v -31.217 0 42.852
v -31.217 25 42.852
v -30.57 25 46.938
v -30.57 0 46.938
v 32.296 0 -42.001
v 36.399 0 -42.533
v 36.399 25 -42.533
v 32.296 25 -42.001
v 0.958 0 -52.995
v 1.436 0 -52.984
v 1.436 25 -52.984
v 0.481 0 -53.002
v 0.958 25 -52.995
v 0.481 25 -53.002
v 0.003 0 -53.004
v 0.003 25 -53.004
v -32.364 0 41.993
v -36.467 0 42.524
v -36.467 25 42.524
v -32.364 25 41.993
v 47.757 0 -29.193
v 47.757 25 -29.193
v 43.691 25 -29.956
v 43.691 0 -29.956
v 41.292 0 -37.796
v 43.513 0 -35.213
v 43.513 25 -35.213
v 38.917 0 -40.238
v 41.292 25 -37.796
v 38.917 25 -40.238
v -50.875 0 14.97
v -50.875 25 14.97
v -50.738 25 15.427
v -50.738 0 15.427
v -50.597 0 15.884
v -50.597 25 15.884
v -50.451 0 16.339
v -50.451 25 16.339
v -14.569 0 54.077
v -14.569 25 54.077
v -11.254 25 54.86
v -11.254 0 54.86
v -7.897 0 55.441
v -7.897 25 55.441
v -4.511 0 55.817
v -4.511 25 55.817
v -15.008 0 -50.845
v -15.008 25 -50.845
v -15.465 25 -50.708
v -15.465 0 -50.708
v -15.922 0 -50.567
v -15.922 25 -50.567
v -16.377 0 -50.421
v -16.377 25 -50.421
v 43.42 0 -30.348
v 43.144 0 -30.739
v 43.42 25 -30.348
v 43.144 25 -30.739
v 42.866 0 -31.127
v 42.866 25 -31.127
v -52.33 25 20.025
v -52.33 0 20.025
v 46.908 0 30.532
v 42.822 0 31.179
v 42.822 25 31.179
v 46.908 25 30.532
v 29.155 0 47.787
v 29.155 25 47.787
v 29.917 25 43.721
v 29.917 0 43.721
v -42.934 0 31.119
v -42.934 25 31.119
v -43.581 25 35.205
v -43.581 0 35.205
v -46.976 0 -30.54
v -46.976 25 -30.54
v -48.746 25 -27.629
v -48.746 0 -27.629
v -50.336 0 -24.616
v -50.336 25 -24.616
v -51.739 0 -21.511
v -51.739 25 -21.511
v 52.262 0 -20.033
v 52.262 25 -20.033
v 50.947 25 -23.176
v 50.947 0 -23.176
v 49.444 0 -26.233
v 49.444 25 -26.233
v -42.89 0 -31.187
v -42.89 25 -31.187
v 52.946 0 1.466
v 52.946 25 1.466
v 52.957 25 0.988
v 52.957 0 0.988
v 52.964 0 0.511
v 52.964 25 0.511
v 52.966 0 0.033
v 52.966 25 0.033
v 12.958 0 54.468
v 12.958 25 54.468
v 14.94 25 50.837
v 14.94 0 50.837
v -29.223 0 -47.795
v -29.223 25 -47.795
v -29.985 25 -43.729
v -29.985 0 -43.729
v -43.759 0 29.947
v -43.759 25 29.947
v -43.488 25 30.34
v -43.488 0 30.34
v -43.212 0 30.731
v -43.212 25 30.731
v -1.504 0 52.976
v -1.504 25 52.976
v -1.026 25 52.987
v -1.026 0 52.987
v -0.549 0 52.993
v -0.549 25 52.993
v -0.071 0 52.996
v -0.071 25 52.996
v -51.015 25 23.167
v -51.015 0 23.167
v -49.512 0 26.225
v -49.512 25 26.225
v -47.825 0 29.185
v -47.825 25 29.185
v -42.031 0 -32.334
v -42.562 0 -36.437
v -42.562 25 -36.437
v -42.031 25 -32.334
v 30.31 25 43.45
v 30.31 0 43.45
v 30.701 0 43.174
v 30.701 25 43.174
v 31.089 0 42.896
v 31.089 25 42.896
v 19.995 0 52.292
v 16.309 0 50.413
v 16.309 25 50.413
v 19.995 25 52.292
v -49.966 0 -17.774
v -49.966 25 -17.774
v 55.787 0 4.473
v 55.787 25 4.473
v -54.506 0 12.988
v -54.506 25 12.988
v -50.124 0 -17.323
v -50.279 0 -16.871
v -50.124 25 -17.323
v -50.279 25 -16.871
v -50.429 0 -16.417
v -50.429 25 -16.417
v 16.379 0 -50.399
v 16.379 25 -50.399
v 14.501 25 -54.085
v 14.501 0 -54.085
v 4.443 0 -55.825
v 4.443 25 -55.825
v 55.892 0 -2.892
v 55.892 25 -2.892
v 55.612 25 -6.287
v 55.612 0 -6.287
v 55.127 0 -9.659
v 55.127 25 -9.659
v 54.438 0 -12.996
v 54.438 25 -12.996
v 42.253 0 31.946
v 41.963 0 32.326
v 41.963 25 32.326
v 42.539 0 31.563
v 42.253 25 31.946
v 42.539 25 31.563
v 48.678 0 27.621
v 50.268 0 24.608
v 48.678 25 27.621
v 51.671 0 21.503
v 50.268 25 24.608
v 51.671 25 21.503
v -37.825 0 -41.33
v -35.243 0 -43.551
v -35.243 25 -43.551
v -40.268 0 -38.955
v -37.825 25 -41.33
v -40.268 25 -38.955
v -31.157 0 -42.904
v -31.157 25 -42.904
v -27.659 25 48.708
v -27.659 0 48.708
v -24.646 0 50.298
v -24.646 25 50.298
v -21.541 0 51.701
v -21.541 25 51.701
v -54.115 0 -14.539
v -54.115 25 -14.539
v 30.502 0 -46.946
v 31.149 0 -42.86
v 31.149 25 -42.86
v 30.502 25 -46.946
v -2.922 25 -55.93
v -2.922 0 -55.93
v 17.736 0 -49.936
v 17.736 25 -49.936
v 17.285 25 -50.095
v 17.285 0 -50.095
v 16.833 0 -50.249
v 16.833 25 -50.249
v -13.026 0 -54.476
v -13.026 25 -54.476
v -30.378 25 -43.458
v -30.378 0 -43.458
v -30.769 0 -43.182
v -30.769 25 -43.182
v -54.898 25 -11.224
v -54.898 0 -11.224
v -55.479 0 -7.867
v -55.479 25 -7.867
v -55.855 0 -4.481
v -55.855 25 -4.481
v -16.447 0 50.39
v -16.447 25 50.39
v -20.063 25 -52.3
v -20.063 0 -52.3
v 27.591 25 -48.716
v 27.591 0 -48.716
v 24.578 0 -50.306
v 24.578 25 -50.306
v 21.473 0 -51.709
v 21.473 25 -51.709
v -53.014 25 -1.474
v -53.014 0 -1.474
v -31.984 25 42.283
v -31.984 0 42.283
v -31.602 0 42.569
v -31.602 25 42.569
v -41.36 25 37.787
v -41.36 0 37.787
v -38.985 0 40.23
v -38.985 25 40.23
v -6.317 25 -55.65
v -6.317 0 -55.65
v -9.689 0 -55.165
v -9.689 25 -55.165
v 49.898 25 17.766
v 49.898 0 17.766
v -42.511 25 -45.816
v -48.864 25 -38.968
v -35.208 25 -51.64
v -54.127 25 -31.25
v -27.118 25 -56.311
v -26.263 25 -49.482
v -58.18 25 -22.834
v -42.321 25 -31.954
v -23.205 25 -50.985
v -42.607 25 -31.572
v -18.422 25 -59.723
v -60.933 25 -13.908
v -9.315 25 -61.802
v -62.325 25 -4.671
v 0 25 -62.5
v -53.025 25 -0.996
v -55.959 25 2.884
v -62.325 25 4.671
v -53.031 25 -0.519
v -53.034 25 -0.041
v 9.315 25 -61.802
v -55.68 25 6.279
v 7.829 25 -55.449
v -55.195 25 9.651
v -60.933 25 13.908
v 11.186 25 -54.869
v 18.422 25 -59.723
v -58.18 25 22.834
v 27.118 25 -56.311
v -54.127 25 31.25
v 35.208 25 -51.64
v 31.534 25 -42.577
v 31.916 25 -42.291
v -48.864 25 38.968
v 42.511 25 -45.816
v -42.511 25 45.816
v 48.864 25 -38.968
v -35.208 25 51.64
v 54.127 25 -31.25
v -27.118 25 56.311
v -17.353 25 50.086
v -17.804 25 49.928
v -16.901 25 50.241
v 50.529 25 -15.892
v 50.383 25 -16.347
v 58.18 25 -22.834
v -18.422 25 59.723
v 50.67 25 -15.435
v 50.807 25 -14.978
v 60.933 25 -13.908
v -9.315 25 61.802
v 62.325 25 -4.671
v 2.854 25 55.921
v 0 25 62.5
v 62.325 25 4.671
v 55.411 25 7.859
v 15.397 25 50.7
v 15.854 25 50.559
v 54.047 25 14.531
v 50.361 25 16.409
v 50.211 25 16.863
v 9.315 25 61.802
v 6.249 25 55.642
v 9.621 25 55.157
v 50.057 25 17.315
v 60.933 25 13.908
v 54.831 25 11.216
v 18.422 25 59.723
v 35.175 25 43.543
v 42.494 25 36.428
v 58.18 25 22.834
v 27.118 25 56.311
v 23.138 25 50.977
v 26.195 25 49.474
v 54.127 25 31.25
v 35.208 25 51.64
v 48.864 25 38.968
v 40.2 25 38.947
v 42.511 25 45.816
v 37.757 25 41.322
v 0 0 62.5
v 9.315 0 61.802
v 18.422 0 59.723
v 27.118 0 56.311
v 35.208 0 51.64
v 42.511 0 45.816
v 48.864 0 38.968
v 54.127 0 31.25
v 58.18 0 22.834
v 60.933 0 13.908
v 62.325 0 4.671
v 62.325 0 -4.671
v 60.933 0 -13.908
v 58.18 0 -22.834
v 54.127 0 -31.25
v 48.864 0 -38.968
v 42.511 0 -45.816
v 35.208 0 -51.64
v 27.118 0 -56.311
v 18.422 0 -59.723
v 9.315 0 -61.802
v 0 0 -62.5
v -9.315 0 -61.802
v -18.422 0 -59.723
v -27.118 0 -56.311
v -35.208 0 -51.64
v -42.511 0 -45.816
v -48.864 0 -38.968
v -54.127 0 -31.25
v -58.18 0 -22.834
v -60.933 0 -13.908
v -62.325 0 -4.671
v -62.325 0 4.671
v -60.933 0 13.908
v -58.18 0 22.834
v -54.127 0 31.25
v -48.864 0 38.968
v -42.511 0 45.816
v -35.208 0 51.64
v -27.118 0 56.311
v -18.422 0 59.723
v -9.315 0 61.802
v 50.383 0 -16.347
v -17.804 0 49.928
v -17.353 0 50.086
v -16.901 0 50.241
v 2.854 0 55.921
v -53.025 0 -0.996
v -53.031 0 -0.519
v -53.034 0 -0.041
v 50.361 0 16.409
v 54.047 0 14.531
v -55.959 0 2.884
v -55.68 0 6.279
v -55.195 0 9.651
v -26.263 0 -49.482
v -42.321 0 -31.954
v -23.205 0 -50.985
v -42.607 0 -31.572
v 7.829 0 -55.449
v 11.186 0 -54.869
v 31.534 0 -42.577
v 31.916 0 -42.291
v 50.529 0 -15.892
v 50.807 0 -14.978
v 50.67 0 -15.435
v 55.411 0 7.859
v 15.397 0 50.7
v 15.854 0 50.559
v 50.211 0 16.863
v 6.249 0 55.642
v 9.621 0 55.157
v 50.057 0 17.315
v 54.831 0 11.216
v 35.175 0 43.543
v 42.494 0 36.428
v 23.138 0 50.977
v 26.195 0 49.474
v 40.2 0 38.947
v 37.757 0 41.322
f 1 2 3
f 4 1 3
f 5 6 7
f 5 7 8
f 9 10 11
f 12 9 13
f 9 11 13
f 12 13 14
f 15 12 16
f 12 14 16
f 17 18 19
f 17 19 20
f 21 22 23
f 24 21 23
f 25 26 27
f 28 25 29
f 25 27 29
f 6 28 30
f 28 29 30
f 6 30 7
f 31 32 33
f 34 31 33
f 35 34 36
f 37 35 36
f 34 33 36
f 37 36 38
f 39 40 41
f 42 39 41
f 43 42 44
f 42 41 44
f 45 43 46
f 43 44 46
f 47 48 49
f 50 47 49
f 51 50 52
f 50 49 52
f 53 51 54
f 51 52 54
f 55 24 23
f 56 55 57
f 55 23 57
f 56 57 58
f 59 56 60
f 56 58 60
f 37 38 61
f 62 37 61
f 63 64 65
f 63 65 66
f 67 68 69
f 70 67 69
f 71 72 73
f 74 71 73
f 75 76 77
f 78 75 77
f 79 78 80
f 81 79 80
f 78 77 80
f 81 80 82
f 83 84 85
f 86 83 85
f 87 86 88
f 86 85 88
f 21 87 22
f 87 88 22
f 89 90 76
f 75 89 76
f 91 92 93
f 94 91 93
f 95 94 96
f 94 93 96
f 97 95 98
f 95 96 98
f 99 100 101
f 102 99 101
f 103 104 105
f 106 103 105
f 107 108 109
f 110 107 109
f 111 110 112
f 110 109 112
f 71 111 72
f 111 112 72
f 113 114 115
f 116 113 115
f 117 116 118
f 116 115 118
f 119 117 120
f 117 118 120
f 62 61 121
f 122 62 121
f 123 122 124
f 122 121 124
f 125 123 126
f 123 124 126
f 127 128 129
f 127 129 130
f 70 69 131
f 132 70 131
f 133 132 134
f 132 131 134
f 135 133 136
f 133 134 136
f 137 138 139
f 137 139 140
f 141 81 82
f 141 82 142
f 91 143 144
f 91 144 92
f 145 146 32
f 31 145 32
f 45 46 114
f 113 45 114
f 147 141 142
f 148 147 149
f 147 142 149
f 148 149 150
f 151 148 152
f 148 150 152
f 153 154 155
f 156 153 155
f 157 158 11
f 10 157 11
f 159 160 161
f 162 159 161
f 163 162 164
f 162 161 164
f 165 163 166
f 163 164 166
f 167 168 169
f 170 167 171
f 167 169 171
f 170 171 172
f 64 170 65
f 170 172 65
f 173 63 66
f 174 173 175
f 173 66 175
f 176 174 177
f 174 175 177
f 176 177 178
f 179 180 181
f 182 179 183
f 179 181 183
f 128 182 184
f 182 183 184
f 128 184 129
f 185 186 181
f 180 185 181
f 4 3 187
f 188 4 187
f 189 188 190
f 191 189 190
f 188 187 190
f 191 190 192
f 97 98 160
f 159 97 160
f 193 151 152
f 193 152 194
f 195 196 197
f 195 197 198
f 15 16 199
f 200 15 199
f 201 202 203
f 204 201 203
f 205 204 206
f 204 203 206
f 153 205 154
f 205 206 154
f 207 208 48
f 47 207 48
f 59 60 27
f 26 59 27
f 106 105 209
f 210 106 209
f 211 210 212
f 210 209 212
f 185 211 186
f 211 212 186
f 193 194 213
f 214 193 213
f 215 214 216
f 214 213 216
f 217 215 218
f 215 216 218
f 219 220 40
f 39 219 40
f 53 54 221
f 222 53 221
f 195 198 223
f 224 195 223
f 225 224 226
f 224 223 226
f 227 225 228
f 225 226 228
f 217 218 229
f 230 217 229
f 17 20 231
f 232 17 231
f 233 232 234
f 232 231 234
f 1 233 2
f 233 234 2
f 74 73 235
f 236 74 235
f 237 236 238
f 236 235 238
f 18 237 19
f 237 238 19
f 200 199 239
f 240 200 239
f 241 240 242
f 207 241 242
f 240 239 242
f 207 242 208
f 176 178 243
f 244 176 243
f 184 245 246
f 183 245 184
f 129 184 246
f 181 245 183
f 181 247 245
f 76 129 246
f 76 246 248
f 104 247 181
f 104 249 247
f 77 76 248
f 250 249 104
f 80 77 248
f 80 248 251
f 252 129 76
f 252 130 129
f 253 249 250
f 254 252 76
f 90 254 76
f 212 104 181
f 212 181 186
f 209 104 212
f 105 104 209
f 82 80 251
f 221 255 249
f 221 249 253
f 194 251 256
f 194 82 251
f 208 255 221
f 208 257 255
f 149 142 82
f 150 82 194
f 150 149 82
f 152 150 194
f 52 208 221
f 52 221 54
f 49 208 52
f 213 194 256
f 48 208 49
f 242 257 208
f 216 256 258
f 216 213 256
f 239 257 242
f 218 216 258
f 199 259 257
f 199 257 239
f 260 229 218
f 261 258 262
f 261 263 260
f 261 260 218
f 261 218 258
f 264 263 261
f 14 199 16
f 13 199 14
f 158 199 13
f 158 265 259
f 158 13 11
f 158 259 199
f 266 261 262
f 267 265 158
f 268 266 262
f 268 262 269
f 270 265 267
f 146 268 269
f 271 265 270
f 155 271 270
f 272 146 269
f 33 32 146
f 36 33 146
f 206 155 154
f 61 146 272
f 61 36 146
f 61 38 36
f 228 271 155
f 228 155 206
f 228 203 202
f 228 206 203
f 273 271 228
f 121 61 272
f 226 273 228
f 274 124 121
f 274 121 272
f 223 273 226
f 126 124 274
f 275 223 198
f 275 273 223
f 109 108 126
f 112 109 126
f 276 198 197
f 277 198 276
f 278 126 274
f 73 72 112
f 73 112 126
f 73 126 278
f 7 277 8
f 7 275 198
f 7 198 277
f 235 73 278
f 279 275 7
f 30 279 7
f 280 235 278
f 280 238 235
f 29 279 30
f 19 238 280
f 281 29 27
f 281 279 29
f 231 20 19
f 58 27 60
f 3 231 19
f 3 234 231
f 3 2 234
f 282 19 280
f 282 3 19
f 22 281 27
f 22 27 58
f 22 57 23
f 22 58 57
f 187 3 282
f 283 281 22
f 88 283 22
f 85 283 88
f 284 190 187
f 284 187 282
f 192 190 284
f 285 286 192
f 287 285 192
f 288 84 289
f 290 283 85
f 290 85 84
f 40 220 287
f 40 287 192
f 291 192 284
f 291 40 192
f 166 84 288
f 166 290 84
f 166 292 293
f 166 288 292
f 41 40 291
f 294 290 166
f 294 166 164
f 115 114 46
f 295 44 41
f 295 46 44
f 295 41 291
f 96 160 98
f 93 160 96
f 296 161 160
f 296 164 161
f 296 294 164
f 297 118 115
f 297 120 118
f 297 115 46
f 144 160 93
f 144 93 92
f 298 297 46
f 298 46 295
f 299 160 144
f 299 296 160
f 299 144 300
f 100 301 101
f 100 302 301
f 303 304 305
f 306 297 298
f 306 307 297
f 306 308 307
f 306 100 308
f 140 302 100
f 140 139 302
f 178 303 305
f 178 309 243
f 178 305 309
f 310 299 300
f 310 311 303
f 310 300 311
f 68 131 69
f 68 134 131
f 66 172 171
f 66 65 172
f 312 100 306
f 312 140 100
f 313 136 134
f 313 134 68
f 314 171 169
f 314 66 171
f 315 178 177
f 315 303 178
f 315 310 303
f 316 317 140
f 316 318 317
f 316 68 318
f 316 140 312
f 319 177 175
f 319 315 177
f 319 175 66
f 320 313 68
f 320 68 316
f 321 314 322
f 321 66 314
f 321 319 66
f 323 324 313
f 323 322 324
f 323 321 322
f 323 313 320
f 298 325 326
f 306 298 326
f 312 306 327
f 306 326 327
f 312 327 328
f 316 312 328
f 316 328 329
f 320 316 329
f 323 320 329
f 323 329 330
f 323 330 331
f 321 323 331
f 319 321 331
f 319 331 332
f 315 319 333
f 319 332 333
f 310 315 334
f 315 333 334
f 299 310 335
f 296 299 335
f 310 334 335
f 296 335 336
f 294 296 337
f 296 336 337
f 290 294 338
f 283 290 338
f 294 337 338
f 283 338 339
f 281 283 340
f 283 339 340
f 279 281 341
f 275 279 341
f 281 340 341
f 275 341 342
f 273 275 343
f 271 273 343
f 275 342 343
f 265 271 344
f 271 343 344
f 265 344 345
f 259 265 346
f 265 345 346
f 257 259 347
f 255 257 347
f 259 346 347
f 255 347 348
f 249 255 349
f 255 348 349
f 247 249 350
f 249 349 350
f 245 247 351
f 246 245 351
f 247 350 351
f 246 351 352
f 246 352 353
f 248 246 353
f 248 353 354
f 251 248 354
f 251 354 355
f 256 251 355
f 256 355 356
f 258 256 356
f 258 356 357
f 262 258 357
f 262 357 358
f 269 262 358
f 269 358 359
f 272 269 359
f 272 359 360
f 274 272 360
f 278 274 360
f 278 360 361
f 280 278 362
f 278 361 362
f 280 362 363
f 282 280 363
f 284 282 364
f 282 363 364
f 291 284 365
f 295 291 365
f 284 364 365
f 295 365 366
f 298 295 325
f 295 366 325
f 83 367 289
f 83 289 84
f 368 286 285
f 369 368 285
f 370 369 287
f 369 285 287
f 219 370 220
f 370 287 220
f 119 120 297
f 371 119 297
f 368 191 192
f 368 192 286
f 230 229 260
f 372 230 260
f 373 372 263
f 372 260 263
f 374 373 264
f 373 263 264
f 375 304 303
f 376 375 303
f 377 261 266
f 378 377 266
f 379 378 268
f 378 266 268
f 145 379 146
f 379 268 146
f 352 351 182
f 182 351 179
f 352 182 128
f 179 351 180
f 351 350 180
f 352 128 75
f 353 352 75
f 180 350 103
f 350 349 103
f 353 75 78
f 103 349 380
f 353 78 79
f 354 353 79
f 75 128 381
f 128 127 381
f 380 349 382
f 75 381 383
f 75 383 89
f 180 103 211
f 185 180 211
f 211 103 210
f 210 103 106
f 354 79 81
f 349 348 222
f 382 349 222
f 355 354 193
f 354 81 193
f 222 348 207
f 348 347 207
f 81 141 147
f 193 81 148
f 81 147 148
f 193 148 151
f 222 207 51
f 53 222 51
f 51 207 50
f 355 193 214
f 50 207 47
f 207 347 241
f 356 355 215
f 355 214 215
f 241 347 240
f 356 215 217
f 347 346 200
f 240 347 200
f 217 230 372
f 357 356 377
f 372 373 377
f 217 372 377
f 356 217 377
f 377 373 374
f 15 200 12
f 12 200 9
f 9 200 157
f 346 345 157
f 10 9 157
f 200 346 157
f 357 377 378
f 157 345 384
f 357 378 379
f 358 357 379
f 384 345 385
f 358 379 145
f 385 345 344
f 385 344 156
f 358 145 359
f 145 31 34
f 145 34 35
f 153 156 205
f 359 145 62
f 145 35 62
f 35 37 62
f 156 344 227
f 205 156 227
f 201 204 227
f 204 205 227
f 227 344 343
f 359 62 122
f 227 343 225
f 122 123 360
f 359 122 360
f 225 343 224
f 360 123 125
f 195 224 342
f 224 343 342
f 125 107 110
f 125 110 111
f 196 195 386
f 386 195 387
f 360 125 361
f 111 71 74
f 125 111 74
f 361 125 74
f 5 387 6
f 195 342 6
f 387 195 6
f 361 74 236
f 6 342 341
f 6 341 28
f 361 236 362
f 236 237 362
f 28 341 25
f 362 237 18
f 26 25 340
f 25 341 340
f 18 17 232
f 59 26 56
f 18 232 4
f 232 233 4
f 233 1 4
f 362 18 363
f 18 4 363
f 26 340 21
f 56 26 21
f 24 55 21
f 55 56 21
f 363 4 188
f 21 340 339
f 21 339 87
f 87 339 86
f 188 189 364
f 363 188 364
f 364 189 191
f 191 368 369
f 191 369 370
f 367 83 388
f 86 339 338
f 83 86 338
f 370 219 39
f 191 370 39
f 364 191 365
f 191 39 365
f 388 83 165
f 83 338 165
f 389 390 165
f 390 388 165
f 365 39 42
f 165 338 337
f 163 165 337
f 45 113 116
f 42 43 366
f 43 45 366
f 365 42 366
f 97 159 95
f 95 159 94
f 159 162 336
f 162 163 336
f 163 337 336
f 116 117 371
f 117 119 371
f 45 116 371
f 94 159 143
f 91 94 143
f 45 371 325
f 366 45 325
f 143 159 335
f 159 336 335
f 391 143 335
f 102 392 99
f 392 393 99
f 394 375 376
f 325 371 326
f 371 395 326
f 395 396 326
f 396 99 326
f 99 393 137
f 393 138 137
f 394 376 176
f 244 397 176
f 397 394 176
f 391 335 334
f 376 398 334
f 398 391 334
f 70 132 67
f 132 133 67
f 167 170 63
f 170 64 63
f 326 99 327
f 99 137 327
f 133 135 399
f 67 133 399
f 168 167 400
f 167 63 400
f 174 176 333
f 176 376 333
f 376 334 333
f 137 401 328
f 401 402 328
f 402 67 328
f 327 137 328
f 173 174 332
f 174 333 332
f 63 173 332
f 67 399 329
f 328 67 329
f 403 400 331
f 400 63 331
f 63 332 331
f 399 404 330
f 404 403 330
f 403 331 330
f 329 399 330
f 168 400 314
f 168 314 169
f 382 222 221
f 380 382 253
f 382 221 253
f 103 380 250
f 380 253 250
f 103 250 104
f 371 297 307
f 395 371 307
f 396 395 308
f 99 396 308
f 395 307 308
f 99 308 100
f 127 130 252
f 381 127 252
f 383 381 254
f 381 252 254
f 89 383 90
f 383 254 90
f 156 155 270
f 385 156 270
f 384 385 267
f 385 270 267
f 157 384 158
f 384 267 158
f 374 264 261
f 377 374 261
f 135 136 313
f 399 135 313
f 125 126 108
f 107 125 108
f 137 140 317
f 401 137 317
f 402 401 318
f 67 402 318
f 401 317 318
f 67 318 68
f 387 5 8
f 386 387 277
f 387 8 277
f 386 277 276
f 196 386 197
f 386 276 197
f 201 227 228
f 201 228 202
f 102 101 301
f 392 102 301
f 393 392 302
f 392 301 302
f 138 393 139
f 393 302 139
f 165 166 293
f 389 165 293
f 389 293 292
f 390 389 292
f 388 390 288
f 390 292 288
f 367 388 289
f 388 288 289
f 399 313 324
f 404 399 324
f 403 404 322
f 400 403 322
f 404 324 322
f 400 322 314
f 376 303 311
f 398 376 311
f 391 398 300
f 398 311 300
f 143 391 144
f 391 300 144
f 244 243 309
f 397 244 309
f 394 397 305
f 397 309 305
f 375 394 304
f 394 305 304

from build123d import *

# Parameters (mm, degrees)
SKETCH1_R           = 62.5
BOSS_EXTRUDE1_DEPTH = 25
CAVITY1_DEPTH       = 25
CUT_EXTRUDE1_DEPTH  = 25


# Read off the part's stored shape, not the designer's step: Cavity1
with BuildPart() as part:
    # Sketch1 → Boss-Extrude1 (new body)
    with BuildSketch(Plane(origin=(0, 0, 0), x_dir=(1, 0, 0), z_dir=(0, 1, 0))):
        with Locations(Location((0, 0, 0), (0, 0, 270))):
            Circle(SKETCH1_R)
    extrude(amount=BOSS_EXTRUDE1_DEPTH)

    # Cavity1 outline → Cavity1 (cut)
    with BuildSketch(Plane(origin=(0, 0, 0), x_dir=(1, 0, 0), z_dir=(0, 1, 0))):
        with BuildLine():
            Line((16.350867892, -49.873660473), (20.022970331, -51.745036944))
            ThreePointArc((20.022970331, -51.745036944), (24.456878574, -49.800038203), (28.704396647, -47.476000203))
            Line((28.704396647, -47.476000203), (29.464309883, -43.425207924))
            ThreePointArc((29.464309883, -43.425207924), (30.217762384, -42.903777412), (30.961999914, -42.369276757))
            Line((30.961999914, -42.369276757), (35.032663999, -43.014319485))
            ThreePointArc((35.032663999, -43.014319485), (38.648523661, -39.79436276), (41.969986165, -36.271516008))
            Line((41.969986165, -36.271516008), (41.440942946, -32.18415751))
            ThreePointArc((41.440942946, -32.18415751), (41.996387967, -31.455417996), (42.539030133, -30.717095621))
            Line((42.539030133, -30.717095621), (46.609790903, -30.07266333))
            ThreePointArc((46.609790903, -30.07266333), (49.053656447, -25.89294042), (51.12393549, -21.5161257))
            Line((51.12393549, -21.5161257), (49.357722251, -17.792300112))
            ThreePointArc((49.357722251, -17.792300112), (49.660788964, -16.927585698), (49.94871817, -16.05771374))
            Line((49.94871817, -16.05771374), (53.621101197, -14.186887953))
            ThreePointArc((53.621101197, -14.186887953), (54.653750036, -9.456539258), (55.270192281, -4.654189691))
            Line((55.270192281, -4.654189691), (52.43969828, -1.658411006))
            ThreePointArc((52.43969828, -1.658411006), (52.460720403, -0.742365963), (52.465752134, 0.173906448))
            Line((52.465752134, 0.173906448), (55.380278979, 3.087996269))
            ThreePointArc((55.380278979, 3.087996269), (54.900628251, 7.905931261), (54.002892036, 12.66372824))
            Line((54.002892036, 12.66372824), (50.385185747, 14.63821233))
            ThreePointArc((50.385185747, 14.63821233), (50.122105488, 15.515919131), (49.843747202, 16.388900869))
            Line((49.843747202, 16.388900869), (51.715123672, 20.061003308))
            ThreePointArc((51.715123672, 20.061003308), (49.770124931, 24.49491155), (47.446086932, 28.742429624))
            Line((47.446086932, 28.742429624), (43.395294653, 29.50234286))
            ThreePointArc((43.395294653, 29.50234286), (42.87386414, 30.255795361), (42.339363485, 31.000032891))
            Line((42.339363485, 31.000032891), (42.984406214, 35.070696976))
            ThreePointArc((42.984406214, 35.070696976), (39.764449489, 38.686556638), (36.241602736, 42.008019142))
            Line((36.241602736, 42.008019142), (32.154244239, 41.478975923))
            ThreePointArc((32.154244239, 41.478975923), (31.425504725, 42.034420944), (30.68718235, 42.57706311))
            Line((30.68718235, 42.57706311), (30.042750059, 46.64782388))
            ThreePointArc((30.042750059, 46.64782388), (25.863027148, 49.091689424), (21.486212429, 51.161968467))
            Line((21.486212429, 51.161968467), (17.762386841, 49.395755228))
            ThreePointArc((17.762386841, 49.395755228), (16.897672427, 49.698821941), (16.027800469, 49.986751147))
            Line((16.027800469, 49.986751147), (14.156974682, 53.659134174))
            ThreePointArc((14.156974682, 53.659134174), (9.426625987, 54.691783013), (4.62427642, 55.308225258))
            Line((4.62427642, 55.308225258), (1.628497735, 52.477731257))
            ThreePointArc((1.628497735, 52.477731257), (0.712452692, 52.49875338), (-0.20381972, 52.503785111))
            Line((-0.20381972, 52.503785111), (-3.11790954, 55.418311956))
            ThreePointArc((-3.11790954, 55.418311956), (-7.935844532, 54.938661228), (-12.693641511, 54.040925013))
            Line((-12.693641511, 54.040925013), (-14.668125602, 50.423218724))
            ThreePointArc((-14.668125602, 50.423218724), (-15.545832402, 50.160138465), (-16.41881414, 49.881780179))
            Line((-16.41881414, 49.881780179), (-20.090916579, 51.753156649))
            ThreePointArc((-20.090916579, 51.753156649), (-24.524824822, 49.808157908), (-28.772342895, 47.484119909))
            Line((-28.772342895, 47.484119909), (-29.532256132, 43.43332763))
            ThreePointArc((-29.532256132, 43.43332763), (-30.285708633, 42.911897117), (-31.029946162, 42.377396462))
            Line((-31.029946162, 42.377396462), (-35.100610248, 43.022439191))
            ThreePointArc((-35.100610248, 43.022439191), (-38.71646991, 39.802482465), (-42.037932414, 36.279635713))
            Line((-42.037932414, 36.279635713), (-41.508889194, 32.192277216))
            ThreePointArc((-41.508889194, 32.192277216), (-42.064334215, 31.463537702), (-42.606976382, 30.725215327))
            Line((-42.606976382, 30.725215327), (-46.677737151, 30.080783036))
            ThreePointArc((-46.677737151, 30.080783036), (-49.121602695, 25.901060125), (-51.191881738, 21.524245406))
            Line((-51.191881738, 21.524245406), (-49.425668499, 17.800419818))
            ThreePointArc((-49.425668499, 17.800419818), (-49.728735212, 16.935705404), (-50.016664419, 16.065833446))
            Line((-50.016664419, 16.065833446), (-53.689047445, 14.195007659))
            ThreePointArc((-53.689047445, 14.195007659), (-54.721696284, 9.464658964), (-55.33813853, 4.662309397))
            Line((-55.33813853, 4.662309397), (-52.507644528, 1.666530712))
            ThreePointArc((-52.507644528, 1.666530712), (-52.528666651, 0.750485669), (-52.533698382, -0.165786743))
            Line((-52.533698382, -0.165786743), (-55.448225228, -3.079876563))
            ThreePointArc((-55.448225228, -3.079876563), (-54.968574499, -7.897811555), (-54.070838284, -12.655608534))
            Line((-54.070838284, -12.655608534), (-50.453131995, -14.630092625))
            ThreePointArc((-50.453131995, -14.630092625), (-50.190051736, -15.507799425), (-49.91169345, -16.380781163))
            Line((-49.91169345, -16.380781163), (-51.783069921, -20.052883602))
            ThreePointArc((-51.783069921, -20.052883602), (-49.83807118, -24.486791845), (-47.51403318, -28.734309918))
            Line((-47.51403318, -28.734309918), (-43.463240901, -29.494223155))
            ThreePointArc((-43.463240901, -29.494223155), (-42.941810389, -30.247675656), (-42.407309734, -30.991913185))
            Line((-42.407309734, -30.991913185), (-43.052352462, -35.062577271))
            ThreePointArc((-43.052352462, -35.062577271), (-39.832395737, -38.678436932), (-36.309548985, -41.999899437))
            Line((-36.309548985, -41.999899437), (-32.222190487, -41.470856217))
            ThreePointArc((-32.222190487, -41.470856217), (-31.493450973, -42.026301238), (-30.755128598, -42.568943405))
            Line((-30.755128598, -42.568943405), (-30.110696307, -46.639704174))
            ThreePointArc((-30.110696307, -46.639704174), (-25.930973397, -49.083569718), (-21.554158677, -51.153848761))
            Line((-21.554158677, -51.153848761), (-17.830333089, -49.387635522))
            ThreePointArc((-17.830333089, -49.387635522), (-16.965618675, -49.690702235), (-16.095746717, -49.978631442))
            Line((-16.095746717, -49.978631442), (-14.22492093, -53.651014468))
            ThreePointArc((-14.22492093, -53.651014468), (-9.494572235, -54.683663307), (-4.692222668, -55.300105553))
            Line((-4.692222668, -55.300105553), (-1.696443983, -52.469611551))
            ThreePointArc((-1.696443983, -52.469611551), (-0.78039894, -52.490633674), (0.135873471, -52.495665405))
            Line((0.135873471, -52.495665405), (3.049963292, -55.410192251))
            ThreePointArc((3.049963292, -55.410192251), (7.867898284, -54.930541522), (12.625695263, -54.032805307))
            Line((12.625695263, -54.032805307), (14.600179353, -50.415099018))
            ThreePointArc((14.600179353, -50.415099018), (15.477886154, -50.152018759), (16.350867892, -49.873660473))
        make_face()
    extrude(amount=CAVITY1_DEPTH, mode=Mode.SUBTRACT)

    # Sketch2 → Cut-Extrude1 (cut)
    with BuildSketch(Plane(origin=(0, 25, 0), x_dir=(1, 0, 0), z_dir=(0, 1, 0))):
        with BuildLine():
            Line((-13.025692309, 54.476210835), (-15.00760521, 50.844893266))
            ThreePointArc((-15.00760521, 50.844893266), (-15.693564395, 50.637815404), (-16.376661363, 50.421482845))
            Line((-16.376661363, 50.421482845), (-20.062579743, 52.299900193))
            ThreePointArc((-20.062579743, 52.299900193), (-24.745463125, 50.256843477), (-29.222652686, 47.795491987))
            Line((-29.222652686, 47.795491987), (-29.985425025, 43.729458982))
            ThreePointArc((-29.985425025, 43.729458982), (-30.573820399, 43.320543187), (-31.156633785, 42.903710124))
            Line((-31.156633785, 42.903710124), (-35.242613361, 43.551179765))
            ThreePointArc((-35.242613361, 43.551179765), (-39.064960871, 40.161026813), (-42.562421739, 36.436614779))
            Line((-42.562421739, 36.436614779), (-42.031388044, 32.333877979))
            ThreePointArc((-42.031388044, 32.333877979), (-42.464623369, 31.763151777), (-42.890103336, 31.186620736))
            Line((-42.890103336, 31.186620736), (-46.976179961, 30.539763829))
            ThreePointArc((-46.976179961, 30.539763829), (-49.563833592, 26.134366434), (-51.739209928, 21.511465254))
            Line((-51.739209928, 21.511465254), (-49.966351477, 17.773629122))
            ThreePointArc((-49.966351477, 17.773629122), (-50.20201866, 17.096959171), (-50.428516267, 16.417165027))
            Line((-50.428516267, 16.417165027), (-54.114716289, 14.539300433))
            ThreePointArc((-54.114716289, 14.539300433), (-55.214378475, 9.549889586), (-55.854729287, 4.481021038))
            Line((-55.854729287, 4.481021038), (-53.013585818, 1.473971017))
            ThreePointArc((-53.013585818, 1.473971017), (-53.028616113, 0.757594486), (-53.033960195, 0.041080226))
            Line((-53.033960195, 0.041080226), (-55.959452674, -2.883973584))
            ThreePointArc((-55.959452674, -2.883973584), (-55.463480818, -7.968999586), (-54.506124106, -12.987659332))
            Line((-54.506124106, -12.987659332), (-50.874806537, -14.969572233))
            ThreePointArc((-50.874806537, -14.969572233), (-50.667728675, -15.655531418), (-50.451396116, -16.338628386))
            Line((-50.451396116, -16.338628386), (-52.329813465, -20.024546766))
            ThreePointArc((-52.329813465, -20.024546766), (-50.286756748, -24.707430148), (-47.825405258, -29.184619709))
            Line((-47.825405258, -29.184619709), (-43.759372253, -29.947392048))
            ThreePointArc((-43.759372253, -29.947392048), (-43.350456458, -30.535787422), (-42.933623395, -31.118600808))
            Line((-42.933623395, -31.118600808), (-43.581093036, -35.204580384))
            ThreePointArc((-43.581093036, -35.204580384), (-40.190940085, -39.026927894), (-36.46652805, -42.524388762))
            Line((-36.46652805, -42.524388762), (-32.36379125, -41.993355067))
            ThreePointArc((-32.36379125, -41.993355067), (-31.793065048, -42.426590392), (-31.216534007, -42.852070359))
            Line((-31.216534007, -42.852070359), (-30.5696771, -46.938146984))
            ThreePointArc((-30.5696771, -46.938146984), (-26.164279705, -49.525800615), (-21.541378525, -51.701176951))
            Line((-21.541378525, -51.701176951), (-17.803542393, -49.9283185))
            ThreePointArc((-17.803542393, -49.9283185), (-17.126872442, -50.163985683), (-16.447078298, -50.39048329))
            Line((-16.447078298, -50.39048329), (-14.569213704, -54.076683312))
            ThreePointArc((-14.569213704, -54.076683312), (-9.579802857, -55.176345498), (-4.510934309, -55.81669631))
            Line((-4.510934309, -55.81669631), (-1.503884289, -52.975552841))
            ThreePointArc((-1.503884289, -52.975552841), (-0.787507757, -52.990583136), (-0.070993497, -52.995927218))
            Line((-0.070993497, -52.995927218), (2.854060312, -55.921419697))
            ThreePointArc((2.854060312, -55.921419697), (7.939086314, -55.425447841), (12.957746061, -54.468091129))
            Line((12.957746061, -54.468091129), (14.939658962, -50.83677356))
            ThreePointArc((14.939658962, -50.83677356), (15.625618147, -50.629695698), (16.308715115, -50.413363139))
            Line((16.308715115, -50.413363139), (19.994633494, -52.291780488))
            ThreePointArc((19.994633494, -52.291780488), (24.677516877, -50.248723771), (29.154706438, -47.787372281))
            Line((29.154706438, -47.787372281), (29.917478777, -43.721339276))
            ThreePointArc((29.917478777, -43.721339276), (30.505874151, -43.312423481), (31.088687537, -42.895590418))
            Line((31.088687537, -42.895590418), (35.174667113, -43.543060059))
            ThreePointArc((35.174667113, -43.543060059), (38.997014623, -40.152907108), (42.494475491, -36.428495073))
            Line((42.494475491, -36.428495073), (41.963441796, -32.325758273))
            ThreePointArc((41.963441796, -32.325758273), (42.39667712, -31.755032071), (42.822157088, -31.17850103))
            Line((42.822157088, -31.17850103), (46.908233712, -30.531644123))
            ThreePointArc((46.908233712, -30.531644123), (49.495887344, -26.126246728), (51.671263679, -21.503345548))
            Line((51.671263679, -21.503345548), (49.898405229, -17.765509416))
            ThreePointArc((49.898405229, -17.765509416), (50.134072412, -17.088839465), (50.360570019, -16.409045321))
            Line((50.360570019, -16.409045321), (54.046770041, -14.531180727))
            ThreePointArc((54.046770041, -14.531180727), (55.146432227, -9.54176988), (55.786783038, -4.472901332))
            Line((55.786783038, -4.472901332), (52.94563957, -1.465851312))
            ThreePointArc((52.94563957, -1.465851312), (52.960669865, -0.74947478), (52.966013947, -0.03296052))
            Line((52.966013947, -0.03296052), (55.891506426, 2.892093289))
            ThreePointArc((55.891506426, 2.892093289), (55.39553457, 7.977119292), (54.438177858, 12.995779038))
            Line((54.438177858, 12.995779038), (50.806860289, 14.977691939))
            ThreePointArc((50.806860289, 14.977691939), (50.599782427, 15.663651124), (50.383449868, 16.346748092))
            Line((50.383449868, 16.346748092), (52.261867216, 20.032666471))
            ThreePointArc((52.261867216, 20.032666471), (50.2188105, 24.715549854), (47.75745901, 29.192739415))
            Line((47.75745901, 29.192739415), (43.691426005, 29.955511754))
            ThreePointArc((43.691426005, 29.955511754), (43.28251021, 30.543907128), (42.865677147, 31.126720514))
            Line((42.865677147, 31.126720514), (43.513146788, 35.21270009))
            ThreePointArc((43.513146788, 35.21270009), (40.122993836, 39.0350476), (36.398581802, 42.532508468))
            Line((36.398581802, 42.532508468), (32.295845002, 42.001474773))
            ThreePointArc((32.295845002, 42.001474773), (31.7251188, 42.434710097), (31.148587759, 42.860190065))
            Line((31.148587759, 42.860190065), (30.501730852, 46.946266689))
            ThreePointArc((30.501730852, 46.946266689), (26.096333457, 49.533920321), (21.473432277, 51.709296656))
            Line((21.473432277, 51.709296656), (17.735596145, 49.936438206))
            ThreePointArc((17.735596145, 49.936438206), (17.058926194, 50.172105389), (16.37913205, 50.398602996))
            Line((16.37913205, 50.398602996), (14.501267456, 54.084803018))
            ThreePointArc((14.501267456, 54.084803018), (9.511856609, 55.184465204), (4.442988061, 55.824816015))
            Line((4.442988061, 55.824816015), (1.43593804, 52.983672547))
            ThreePointArc((1.43593804, 52.983672547), (0.719561509, 52.998702842), (0.003047249, 53.004046924))
            Line((0.003047249, 53.004046924), (-2.922006561, 55.929539403))
            ThreePointArc((-2.922006561, 55.929539403), (-8.007032563, 55.433567547), (-13.025692309, 54.476210835))
        make_face()
    extrude(amount=-CUT_EXTRUDE1_DEPTH, mode=Mode.SUBTRACT)


solid = part.part
